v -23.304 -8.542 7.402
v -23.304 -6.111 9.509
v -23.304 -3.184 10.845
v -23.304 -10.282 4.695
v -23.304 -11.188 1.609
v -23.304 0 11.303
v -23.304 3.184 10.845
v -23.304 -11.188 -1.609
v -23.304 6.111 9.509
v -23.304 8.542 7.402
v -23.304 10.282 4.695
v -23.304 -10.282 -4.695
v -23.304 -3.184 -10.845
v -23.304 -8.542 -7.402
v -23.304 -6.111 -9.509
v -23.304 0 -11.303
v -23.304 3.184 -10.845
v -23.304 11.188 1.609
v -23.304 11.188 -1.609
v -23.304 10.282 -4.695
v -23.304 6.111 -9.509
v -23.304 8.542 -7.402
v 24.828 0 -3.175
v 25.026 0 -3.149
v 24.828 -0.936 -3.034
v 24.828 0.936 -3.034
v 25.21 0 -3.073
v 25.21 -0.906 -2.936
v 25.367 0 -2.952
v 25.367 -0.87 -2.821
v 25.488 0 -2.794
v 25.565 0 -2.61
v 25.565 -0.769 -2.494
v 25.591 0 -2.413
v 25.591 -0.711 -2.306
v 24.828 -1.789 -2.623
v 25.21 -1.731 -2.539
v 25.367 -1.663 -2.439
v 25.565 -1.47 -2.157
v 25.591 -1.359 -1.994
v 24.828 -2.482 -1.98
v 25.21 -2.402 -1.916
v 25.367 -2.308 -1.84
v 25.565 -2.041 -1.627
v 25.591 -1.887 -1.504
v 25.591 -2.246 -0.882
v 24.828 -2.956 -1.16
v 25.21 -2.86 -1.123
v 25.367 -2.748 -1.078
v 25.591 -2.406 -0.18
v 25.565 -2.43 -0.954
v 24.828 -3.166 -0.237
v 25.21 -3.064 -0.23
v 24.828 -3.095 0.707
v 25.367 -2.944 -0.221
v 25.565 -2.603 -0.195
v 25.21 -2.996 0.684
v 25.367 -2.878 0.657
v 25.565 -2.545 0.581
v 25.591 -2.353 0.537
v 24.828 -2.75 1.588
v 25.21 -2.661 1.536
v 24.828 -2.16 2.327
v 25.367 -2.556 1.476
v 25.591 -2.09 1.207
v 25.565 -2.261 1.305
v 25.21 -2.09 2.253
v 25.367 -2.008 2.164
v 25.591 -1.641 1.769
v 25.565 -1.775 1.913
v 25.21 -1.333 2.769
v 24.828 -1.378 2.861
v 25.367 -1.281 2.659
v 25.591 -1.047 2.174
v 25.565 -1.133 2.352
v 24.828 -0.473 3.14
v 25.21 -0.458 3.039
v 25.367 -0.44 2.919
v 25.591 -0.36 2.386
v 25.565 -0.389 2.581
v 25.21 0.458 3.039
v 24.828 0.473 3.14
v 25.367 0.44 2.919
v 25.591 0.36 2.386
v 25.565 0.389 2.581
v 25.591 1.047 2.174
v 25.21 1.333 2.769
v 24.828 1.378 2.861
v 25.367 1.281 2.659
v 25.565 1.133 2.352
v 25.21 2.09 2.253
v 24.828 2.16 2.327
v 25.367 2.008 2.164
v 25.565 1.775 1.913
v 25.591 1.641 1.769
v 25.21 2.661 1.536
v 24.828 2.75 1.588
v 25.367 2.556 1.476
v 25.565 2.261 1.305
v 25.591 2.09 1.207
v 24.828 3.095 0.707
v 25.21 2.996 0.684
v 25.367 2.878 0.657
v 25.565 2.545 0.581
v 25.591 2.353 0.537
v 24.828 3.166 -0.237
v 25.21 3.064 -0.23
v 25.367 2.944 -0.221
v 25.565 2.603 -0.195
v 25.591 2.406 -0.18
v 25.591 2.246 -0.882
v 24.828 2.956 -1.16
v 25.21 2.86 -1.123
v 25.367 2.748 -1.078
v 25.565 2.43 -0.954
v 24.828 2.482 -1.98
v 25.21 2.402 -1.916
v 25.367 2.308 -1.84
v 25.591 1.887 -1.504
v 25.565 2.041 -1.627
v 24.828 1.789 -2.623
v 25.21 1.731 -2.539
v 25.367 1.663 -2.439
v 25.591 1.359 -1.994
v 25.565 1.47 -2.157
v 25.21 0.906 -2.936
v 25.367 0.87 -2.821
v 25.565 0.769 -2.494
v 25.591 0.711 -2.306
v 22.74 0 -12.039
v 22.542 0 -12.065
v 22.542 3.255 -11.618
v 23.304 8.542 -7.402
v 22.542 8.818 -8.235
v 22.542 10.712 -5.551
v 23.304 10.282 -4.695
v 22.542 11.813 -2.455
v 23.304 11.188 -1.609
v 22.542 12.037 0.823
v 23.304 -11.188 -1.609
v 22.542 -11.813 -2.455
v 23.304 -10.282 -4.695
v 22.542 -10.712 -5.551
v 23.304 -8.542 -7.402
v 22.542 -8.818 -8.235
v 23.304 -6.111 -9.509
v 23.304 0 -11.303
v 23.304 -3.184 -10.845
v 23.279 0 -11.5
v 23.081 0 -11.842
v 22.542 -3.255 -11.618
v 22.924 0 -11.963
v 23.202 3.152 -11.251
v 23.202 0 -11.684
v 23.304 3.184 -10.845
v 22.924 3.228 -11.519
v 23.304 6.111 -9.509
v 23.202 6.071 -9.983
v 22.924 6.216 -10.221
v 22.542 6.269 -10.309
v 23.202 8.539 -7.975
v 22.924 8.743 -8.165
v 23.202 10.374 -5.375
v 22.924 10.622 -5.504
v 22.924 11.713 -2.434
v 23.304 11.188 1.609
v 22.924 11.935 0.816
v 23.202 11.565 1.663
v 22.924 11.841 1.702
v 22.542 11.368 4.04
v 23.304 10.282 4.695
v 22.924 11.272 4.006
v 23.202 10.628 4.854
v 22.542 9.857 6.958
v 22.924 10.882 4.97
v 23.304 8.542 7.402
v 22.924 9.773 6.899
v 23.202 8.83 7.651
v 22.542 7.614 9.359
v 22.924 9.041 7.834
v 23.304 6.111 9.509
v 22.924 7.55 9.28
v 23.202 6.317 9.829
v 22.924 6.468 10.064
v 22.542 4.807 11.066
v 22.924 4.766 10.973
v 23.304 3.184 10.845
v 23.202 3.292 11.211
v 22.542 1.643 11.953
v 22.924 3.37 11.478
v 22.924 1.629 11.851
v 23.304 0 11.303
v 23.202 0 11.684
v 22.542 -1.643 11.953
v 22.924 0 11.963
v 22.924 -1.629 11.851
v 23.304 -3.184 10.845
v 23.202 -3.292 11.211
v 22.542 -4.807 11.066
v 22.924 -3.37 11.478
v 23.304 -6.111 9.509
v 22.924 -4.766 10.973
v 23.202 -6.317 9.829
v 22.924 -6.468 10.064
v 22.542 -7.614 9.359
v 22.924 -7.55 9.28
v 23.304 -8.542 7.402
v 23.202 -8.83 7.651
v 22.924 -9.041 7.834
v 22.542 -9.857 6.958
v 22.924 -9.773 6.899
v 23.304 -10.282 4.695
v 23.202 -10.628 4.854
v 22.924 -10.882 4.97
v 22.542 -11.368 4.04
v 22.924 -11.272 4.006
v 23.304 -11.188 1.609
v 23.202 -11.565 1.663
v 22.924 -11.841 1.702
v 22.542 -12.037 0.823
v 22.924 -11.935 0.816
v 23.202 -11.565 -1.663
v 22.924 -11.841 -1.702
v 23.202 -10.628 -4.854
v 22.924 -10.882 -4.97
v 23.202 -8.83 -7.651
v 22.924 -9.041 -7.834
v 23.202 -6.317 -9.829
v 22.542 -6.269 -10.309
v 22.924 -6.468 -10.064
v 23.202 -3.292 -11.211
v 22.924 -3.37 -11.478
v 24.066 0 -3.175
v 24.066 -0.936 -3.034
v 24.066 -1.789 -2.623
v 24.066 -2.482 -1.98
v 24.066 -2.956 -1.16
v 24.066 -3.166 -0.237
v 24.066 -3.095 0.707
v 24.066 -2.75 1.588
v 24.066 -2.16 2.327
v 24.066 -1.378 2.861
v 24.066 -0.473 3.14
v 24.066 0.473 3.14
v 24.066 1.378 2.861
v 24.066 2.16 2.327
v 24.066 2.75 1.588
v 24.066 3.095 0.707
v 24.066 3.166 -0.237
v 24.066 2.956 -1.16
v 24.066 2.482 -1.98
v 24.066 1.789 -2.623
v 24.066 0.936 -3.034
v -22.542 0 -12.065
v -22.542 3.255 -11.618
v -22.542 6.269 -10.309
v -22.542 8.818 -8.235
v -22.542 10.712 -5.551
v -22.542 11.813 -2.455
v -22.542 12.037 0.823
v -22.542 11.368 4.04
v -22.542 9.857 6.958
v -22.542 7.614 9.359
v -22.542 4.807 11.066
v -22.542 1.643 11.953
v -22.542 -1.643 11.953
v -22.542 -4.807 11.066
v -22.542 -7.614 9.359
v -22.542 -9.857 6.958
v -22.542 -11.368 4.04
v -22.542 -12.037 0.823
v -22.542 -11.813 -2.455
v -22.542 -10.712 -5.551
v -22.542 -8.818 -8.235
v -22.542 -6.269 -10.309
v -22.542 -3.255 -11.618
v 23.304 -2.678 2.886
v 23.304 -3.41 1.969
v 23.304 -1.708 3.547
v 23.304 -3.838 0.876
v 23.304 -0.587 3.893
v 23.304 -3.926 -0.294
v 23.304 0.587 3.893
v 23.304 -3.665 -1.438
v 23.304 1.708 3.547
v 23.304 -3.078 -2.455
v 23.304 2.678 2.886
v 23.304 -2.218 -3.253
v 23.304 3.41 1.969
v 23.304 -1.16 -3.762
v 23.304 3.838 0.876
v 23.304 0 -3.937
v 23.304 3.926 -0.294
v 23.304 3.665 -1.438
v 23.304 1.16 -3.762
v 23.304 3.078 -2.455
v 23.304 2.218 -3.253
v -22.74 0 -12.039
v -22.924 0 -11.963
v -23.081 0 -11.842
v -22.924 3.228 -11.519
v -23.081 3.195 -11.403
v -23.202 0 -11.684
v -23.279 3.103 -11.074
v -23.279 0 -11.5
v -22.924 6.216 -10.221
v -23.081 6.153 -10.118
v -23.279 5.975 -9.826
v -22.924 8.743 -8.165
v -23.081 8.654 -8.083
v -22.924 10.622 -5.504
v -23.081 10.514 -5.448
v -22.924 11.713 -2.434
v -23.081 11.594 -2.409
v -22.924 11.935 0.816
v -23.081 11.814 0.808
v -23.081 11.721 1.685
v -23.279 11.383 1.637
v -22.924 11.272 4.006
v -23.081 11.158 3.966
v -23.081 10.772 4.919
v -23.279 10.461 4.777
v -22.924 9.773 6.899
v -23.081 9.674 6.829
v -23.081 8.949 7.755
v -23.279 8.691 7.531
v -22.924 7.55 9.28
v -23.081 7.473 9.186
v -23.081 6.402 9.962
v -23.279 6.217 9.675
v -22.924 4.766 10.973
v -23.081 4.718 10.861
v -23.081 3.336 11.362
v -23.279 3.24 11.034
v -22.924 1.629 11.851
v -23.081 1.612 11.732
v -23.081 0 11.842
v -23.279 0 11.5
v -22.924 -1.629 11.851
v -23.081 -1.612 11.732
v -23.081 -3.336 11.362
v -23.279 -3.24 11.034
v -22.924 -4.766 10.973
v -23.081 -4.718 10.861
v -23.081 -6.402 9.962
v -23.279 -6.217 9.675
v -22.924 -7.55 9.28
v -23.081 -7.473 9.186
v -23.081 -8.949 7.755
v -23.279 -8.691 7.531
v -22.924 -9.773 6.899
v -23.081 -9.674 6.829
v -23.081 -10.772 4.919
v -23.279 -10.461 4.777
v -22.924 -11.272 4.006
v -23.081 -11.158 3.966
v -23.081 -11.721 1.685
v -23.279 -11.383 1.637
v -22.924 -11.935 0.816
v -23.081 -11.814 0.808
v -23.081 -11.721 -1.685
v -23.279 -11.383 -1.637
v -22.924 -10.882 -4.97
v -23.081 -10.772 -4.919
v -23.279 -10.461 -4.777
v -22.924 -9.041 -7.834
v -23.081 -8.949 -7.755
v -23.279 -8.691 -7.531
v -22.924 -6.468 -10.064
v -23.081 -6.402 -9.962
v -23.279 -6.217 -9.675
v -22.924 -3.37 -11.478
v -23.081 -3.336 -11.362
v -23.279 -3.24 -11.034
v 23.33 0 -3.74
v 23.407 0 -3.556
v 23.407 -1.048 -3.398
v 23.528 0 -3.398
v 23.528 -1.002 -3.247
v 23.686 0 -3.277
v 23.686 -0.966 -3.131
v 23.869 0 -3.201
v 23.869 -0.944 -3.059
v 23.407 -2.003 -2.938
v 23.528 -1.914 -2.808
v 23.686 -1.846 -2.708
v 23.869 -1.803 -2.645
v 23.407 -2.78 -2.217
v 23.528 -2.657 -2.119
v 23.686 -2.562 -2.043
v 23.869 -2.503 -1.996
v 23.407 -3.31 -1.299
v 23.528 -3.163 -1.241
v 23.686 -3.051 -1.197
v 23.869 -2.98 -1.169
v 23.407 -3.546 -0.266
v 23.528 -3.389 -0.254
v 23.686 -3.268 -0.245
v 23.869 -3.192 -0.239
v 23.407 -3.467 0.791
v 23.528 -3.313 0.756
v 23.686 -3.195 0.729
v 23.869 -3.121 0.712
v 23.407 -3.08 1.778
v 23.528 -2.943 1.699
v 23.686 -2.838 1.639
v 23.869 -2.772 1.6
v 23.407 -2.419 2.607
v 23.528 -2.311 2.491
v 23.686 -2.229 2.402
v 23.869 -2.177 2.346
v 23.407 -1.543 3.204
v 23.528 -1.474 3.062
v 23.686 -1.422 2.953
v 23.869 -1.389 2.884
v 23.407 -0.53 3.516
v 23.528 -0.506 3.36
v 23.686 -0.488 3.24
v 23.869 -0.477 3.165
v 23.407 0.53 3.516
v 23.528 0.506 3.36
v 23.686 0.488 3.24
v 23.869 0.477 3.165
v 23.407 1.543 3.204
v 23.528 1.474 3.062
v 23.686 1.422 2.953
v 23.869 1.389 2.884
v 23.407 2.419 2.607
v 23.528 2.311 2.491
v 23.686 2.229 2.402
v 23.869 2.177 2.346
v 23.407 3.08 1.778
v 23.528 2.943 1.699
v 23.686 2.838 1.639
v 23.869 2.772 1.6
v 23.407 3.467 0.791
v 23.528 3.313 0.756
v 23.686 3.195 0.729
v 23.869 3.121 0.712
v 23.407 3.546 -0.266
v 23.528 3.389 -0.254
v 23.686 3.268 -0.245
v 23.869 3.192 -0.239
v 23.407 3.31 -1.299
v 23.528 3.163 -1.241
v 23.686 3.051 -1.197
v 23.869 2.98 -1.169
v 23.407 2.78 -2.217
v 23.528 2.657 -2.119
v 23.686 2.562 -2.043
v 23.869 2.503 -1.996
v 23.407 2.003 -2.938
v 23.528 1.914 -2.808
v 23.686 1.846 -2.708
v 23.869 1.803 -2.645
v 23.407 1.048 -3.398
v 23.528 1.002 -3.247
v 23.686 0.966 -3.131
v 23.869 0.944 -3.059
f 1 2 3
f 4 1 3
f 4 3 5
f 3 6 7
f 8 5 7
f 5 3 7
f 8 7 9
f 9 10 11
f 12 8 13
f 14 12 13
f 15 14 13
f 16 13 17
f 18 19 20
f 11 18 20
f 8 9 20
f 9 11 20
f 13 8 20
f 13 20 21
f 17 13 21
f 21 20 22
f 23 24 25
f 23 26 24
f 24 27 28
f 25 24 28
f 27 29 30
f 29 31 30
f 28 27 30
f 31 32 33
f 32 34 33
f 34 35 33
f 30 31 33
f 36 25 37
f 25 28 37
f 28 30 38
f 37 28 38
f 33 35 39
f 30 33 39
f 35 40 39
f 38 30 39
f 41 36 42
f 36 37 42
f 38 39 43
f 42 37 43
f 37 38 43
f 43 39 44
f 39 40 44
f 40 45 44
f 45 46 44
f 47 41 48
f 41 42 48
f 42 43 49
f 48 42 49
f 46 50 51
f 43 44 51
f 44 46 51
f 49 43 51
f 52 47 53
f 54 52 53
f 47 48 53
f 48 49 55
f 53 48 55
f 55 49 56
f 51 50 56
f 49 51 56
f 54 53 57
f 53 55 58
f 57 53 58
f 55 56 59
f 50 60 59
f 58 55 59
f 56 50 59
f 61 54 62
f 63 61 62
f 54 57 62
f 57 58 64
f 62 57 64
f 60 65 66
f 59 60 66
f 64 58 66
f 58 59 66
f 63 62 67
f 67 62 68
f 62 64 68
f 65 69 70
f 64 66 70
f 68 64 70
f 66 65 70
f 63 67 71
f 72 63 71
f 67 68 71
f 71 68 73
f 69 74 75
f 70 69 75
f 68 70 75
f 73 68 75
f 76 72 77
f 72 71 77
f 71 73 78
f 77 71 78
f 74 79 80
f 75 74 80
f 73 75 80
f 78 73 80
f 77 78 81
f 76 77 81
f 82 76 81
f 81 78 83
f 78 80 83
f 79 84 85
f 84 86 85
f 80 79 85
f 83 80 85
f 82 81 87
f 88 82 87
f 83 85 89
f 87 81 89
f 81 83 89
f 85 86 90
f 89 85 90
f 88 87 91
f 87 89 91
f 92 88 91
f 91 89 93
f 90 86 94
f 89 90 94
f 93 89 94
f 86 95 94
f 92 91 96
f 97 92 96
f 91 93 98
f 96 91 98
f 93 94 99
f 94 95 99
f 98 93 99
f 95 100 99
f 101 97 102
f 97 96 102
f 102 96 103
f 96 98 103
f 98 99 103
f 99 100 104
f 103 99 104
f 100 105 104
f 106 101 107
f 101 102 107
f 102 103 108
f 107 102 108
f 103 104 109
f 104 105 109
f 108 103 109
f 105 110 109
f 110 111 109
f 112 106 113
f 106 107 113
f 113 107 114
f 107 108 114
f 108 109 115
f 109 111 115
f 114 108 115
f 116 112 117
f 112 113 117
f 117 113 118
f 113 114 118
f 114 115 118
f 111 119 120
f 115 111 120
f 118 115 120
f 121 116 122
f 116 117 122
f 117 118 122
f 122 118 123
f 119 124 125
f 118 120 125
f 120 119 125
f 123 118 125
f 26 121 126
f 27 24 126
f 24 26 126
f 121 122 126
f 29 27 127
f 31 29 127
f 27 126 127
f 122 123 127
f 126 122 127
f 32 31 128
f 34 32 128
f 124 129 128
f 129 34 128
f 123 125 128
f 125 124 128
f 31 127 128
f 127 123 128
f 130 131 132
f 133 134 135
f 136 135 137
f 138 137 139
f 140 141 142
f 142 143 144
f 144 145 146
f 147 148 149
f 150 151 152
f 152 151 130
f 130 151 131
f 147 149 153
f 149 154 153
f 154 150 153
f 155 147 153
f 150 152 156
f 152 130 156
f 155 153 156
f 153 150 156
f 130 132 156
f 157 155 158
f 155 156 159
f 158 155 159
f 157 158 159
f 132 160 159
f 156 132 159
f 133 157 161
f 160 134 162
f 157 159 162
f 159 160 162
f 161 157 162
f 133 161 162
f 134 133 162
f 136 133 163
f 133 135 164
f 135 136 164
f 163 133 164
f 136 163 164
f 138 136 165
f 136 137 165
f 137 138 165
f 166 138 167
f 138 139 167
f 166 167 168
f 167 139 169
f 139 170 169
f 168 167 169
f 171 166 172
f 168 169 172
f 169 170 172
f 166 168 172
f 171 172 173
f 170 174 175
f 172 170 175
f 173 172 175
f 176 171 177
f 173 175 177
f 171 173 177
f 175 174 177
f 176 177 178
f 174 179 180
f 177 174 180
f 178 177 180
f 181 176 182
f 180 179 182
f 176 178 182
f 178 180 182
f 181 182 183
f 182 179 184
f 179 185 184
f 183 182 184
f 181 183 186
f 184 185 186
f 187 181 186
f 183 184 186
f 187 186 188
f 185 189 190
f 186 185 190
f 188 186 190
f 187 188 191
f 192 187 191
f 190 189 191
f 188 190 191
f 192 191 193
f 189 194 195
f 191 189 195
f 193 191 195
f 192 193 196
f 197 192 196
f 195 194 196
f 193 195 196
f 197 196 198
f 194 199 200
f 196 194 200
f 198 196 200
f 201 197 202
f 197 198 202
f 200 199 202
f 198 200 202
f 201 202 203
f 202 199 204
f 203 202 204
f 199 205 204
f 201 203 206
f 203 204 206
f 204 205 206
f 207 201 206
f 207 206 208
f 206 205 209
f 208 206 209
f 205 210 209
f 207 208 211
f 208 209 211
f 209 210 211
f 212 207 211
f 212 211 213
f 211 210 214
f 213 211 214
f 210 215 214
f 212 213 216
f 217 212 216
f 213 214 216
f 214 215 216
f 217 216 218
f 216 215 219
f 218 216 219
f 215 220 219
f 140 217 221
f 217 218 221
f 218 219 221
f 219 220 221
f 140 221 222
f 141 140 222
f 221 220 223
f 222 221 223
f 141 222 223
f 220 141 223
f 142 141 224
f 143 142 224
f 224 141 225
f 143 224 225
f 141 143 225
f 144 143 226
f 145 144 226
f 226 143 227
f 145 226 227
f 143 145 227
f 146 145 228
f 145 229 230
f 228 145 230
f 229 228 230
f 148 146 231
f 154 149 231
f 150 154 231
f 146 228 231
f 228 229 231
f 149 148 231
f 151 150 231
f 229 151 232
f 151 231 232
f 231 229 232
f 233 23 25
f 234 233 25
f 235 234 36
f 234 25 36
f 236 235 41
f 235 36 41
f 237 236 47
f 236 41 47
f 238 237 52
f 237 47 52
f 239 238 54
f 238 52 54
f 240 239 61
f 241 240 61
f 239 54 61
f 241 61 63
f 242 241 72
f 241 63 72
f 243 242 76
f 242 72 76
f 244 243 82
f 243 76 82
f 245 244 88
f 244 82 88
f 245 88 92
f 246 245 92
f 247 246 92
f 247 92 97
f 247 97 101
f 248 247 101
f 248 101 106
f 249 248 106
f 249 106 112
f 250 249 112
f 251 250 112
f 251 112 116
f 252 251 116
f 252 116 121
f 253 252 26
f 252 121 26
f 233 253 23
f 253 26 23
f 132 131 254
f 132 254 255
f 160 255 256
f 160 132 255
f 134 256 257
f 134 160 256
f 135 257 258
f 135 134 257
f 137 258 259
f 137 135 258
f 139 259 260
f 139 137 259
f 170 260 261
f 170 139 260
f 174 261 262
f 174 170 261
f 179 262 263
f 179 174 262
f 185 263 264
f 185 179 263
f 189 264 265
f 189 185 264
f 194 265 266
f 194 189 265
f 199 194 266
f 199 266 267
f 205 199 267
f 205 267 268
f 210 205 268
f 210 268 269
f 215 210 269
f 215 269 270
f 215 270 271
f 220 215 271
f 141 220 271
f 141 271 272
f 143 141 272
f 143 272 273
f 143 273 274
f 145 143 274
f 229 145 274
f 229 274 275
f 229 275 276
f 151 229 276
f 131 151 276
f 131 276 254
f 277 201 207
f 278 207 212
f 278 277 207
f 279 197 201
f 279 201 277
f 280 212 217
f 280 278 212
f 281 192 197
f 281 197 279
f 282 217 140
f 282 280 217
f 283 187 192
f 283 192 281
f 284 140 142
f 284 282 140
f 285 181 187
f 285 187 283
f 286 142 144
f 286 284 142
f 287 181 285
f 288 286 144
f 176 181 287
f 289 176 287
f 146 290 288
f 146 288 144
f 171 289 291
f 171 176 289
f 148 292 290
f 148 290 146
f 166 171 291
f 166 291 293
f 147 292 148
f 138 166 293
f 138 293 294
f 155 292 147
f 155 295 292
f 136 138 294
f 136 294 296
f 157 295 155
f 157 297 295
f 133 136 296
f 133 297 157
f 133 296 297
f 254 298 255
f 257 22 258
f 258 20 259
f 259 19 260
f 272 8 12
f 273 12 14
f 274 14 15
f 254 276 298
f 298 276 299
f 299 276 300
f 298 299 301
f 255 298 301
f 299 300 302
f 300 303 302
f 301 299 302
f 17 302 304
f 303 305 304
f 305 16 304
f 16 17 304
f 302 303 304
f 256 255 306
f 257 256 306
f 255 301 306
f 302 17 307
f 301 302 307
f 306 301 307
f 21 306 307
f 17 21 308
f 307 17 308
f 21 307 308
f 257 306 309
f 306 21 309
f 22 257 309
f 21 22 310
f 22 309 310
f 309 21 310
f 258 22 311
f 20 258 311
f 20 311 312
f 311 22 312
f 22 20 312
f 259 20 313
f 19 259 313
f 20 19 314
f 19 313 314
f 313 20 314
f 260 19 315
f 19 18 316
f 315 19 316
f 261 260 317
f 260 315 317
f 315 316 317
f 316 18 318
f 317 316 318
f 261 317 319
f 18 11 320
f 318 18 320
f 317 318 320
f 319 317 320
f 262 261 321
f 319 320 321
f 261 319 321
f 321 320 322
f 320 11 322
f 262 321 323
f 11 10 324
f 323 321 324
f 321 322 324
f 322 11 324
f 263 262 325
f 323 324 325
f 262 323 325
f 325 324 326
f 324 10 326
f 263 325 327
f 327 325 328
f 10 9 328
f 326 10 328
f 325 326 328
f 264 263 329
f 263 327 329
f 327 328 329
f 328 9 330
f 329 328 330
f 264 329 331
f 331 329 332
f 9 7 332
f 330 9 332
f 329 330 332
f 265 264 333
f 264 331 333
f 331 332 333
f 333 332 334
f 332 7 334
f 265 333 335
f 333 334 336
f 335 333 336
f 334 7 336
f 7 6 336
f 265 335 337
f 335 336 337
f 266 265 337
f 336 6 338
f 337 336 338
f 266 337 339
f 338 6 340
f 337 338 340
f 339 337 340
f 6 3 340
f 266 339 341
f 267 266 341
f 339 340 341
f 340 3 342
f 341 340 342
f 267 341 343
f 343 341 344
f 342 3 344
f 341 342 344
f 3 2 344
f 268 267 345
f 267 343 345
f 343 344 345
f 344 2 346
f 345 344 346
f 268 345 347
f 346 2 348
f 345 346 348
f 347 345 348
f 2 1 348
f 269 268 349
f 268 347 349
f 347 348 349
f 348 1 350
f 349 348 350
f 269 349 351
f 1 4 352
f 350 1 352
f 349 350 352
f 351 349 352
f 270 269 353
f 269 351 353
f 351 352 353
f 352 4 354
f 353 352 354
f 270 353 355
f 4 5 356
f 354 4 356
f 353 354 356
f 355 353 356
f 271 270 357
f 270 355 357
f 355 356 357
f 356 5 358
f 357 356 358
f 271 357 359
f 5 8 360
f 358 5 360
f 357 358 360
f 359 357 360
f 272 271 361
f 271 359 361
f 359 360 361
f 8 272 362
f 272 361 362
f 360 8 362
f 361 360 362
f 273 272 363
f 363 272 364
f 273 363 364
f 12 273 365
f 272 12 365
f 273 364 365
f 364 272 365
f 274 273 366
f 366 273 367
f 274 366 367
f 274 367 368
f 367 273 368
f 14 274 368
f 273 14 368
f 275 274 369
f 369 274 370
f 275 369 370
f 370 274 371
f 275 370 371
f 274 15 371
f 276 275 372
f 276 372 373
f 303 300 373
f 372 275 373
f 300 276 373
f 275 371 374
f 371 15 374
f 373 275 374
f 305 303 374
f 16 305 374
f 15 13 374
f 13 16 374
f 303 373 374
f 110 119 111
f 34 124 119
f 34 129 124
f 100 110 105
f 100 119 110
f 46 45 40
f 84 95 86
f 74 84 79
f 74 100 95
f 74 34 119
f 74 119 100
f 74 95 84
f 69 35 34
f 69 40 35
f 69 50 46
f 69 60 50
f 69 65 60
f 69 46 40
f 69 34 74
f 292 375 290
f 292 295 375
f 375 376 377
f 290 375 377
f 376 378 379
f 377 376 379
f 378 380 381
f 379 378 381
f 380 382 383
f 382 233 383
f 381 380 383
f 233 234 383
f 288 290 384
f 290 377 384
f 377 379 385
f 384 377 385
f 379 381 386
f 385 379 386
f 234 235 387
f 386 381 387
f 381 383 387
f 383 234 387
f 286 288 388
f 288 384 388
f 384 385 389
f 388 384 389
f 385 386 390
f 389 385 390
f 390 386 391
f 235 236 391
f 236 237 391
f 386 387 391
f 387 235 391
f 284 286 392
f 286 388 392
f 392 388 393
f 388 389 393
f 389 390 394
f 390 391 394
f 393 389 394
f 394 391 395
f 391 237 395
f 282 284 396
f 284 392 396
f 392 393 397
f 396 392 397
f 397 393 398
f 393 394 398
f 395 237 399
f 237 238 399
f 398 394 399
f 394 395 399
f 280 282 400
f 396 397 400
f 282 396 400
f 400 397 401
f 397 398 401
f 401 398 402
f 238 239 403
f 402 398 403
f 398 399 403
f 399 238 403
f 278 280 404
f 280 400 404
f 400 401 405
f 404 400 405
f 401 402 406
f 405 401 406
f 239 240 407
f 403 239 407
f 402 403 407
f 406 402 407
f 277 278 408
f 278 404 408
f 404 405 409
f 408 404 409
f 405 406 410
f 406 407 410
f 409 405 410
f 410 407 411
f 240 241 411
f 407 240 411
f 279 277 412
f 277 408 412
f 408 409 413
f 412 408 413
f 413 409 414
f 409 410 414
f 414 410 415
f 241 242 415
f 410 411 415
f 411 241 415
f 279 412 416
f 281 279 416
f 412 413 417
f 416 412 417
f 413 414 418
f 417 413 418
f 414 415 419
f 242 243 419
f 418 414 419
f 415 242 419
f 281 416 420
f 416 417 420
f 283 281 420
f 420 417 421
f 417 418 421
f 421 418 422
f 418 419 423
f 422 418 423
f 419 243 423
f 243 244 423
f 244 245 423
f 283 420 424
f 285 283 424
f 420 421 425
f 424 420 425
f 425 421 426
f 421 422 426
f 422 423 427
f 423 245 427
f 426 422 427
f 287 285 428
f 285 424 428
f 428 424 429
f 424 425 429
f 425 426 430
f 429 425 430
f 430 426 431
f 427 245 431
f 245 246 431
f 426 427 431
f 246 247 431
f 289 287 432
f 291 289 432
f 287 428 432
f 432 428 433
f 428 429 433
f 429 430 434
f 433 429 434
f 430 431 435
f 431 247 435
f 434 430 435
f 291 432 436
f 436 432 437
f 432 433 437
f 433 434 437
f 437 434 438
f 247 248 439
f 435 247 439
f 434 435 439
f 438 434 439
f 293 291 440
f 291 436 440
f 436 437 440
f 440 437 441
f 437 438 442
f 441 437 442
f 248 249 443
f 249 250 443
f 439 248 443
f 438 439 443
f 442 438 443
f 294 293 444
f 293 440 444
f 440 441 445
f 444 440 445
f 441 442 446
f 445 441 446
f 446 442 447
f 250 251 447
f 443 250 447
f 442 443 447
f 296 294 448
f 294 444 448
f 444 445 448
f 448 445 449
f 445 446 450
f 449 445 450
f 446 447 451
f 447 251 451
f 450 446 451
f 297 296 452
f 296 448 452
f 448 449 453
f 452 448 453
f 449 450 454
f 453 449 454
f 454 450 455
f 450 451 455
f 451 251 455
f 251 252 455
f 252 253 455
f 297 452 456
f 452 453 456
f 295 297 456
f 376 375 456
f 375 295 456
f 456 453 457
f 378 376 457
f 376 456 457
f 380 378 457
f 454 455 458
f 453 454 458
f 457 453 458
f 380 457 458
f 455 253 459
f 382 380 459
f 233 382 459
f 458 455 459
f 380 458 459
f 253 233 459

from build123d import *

# Parameters (mm, degrees)
SKETCH1_R           = 12.065
BOSS_EXTRUDE1_DEPTH = 23.3045
SKETCH2_W           = 2.286
SKETCH2_H           = 3.175
FILLET2_R           = 0.762
FILLET3_R           = 0.762


with BuildPart() as part:
    # Sketch1 → Boss-Extrude1 (new, symmetric)
    with BuildSketch(Plane(origin=(0, 0, 0), x_dir=(0, 0, -1), z_dir=(1, 0, 0))):
        Circle(SKETCH1_R)
    extrude(amount=BOSS_EXTRUDE1_DEPTH, both=True)

    # Sketch2 → Revolve1 (revolve)
    with BuildSketch(Plane.XY, mode=Mode.PRIVATE) as revolve1_sk:
        with Locations((24.4475, 1.5875)):
            Rectangle(SKETCH2_W, SKETCH2_H)
    revolve(revolve1_sk.sketch.rotate(Axis((23.3045, 0, 0), (-1, 0, 0)), 90), axis=Axis((23.3045, 0, 0), (-1, 0, 0)))

    # Fillet2
    fillet2_edges = [part.edges().sort_by_distance(p)[0] for p in [
        (23.3045, 0, 3.175),
        (25.5905, 0, 3.175),
    ]]
    fillet(fillet2_edges, radius=FILLET2_R)

    # Fillet3
    fillet3_edges = [part.edges().sort_by_distance(p)[0] for p in [
        (-23.3045, 0, 12.065),
        (23.3045, 0, 12.065),
    ]]
    fillet(fillet3_edges, radius=FILLET3_R)


solid = part.part
